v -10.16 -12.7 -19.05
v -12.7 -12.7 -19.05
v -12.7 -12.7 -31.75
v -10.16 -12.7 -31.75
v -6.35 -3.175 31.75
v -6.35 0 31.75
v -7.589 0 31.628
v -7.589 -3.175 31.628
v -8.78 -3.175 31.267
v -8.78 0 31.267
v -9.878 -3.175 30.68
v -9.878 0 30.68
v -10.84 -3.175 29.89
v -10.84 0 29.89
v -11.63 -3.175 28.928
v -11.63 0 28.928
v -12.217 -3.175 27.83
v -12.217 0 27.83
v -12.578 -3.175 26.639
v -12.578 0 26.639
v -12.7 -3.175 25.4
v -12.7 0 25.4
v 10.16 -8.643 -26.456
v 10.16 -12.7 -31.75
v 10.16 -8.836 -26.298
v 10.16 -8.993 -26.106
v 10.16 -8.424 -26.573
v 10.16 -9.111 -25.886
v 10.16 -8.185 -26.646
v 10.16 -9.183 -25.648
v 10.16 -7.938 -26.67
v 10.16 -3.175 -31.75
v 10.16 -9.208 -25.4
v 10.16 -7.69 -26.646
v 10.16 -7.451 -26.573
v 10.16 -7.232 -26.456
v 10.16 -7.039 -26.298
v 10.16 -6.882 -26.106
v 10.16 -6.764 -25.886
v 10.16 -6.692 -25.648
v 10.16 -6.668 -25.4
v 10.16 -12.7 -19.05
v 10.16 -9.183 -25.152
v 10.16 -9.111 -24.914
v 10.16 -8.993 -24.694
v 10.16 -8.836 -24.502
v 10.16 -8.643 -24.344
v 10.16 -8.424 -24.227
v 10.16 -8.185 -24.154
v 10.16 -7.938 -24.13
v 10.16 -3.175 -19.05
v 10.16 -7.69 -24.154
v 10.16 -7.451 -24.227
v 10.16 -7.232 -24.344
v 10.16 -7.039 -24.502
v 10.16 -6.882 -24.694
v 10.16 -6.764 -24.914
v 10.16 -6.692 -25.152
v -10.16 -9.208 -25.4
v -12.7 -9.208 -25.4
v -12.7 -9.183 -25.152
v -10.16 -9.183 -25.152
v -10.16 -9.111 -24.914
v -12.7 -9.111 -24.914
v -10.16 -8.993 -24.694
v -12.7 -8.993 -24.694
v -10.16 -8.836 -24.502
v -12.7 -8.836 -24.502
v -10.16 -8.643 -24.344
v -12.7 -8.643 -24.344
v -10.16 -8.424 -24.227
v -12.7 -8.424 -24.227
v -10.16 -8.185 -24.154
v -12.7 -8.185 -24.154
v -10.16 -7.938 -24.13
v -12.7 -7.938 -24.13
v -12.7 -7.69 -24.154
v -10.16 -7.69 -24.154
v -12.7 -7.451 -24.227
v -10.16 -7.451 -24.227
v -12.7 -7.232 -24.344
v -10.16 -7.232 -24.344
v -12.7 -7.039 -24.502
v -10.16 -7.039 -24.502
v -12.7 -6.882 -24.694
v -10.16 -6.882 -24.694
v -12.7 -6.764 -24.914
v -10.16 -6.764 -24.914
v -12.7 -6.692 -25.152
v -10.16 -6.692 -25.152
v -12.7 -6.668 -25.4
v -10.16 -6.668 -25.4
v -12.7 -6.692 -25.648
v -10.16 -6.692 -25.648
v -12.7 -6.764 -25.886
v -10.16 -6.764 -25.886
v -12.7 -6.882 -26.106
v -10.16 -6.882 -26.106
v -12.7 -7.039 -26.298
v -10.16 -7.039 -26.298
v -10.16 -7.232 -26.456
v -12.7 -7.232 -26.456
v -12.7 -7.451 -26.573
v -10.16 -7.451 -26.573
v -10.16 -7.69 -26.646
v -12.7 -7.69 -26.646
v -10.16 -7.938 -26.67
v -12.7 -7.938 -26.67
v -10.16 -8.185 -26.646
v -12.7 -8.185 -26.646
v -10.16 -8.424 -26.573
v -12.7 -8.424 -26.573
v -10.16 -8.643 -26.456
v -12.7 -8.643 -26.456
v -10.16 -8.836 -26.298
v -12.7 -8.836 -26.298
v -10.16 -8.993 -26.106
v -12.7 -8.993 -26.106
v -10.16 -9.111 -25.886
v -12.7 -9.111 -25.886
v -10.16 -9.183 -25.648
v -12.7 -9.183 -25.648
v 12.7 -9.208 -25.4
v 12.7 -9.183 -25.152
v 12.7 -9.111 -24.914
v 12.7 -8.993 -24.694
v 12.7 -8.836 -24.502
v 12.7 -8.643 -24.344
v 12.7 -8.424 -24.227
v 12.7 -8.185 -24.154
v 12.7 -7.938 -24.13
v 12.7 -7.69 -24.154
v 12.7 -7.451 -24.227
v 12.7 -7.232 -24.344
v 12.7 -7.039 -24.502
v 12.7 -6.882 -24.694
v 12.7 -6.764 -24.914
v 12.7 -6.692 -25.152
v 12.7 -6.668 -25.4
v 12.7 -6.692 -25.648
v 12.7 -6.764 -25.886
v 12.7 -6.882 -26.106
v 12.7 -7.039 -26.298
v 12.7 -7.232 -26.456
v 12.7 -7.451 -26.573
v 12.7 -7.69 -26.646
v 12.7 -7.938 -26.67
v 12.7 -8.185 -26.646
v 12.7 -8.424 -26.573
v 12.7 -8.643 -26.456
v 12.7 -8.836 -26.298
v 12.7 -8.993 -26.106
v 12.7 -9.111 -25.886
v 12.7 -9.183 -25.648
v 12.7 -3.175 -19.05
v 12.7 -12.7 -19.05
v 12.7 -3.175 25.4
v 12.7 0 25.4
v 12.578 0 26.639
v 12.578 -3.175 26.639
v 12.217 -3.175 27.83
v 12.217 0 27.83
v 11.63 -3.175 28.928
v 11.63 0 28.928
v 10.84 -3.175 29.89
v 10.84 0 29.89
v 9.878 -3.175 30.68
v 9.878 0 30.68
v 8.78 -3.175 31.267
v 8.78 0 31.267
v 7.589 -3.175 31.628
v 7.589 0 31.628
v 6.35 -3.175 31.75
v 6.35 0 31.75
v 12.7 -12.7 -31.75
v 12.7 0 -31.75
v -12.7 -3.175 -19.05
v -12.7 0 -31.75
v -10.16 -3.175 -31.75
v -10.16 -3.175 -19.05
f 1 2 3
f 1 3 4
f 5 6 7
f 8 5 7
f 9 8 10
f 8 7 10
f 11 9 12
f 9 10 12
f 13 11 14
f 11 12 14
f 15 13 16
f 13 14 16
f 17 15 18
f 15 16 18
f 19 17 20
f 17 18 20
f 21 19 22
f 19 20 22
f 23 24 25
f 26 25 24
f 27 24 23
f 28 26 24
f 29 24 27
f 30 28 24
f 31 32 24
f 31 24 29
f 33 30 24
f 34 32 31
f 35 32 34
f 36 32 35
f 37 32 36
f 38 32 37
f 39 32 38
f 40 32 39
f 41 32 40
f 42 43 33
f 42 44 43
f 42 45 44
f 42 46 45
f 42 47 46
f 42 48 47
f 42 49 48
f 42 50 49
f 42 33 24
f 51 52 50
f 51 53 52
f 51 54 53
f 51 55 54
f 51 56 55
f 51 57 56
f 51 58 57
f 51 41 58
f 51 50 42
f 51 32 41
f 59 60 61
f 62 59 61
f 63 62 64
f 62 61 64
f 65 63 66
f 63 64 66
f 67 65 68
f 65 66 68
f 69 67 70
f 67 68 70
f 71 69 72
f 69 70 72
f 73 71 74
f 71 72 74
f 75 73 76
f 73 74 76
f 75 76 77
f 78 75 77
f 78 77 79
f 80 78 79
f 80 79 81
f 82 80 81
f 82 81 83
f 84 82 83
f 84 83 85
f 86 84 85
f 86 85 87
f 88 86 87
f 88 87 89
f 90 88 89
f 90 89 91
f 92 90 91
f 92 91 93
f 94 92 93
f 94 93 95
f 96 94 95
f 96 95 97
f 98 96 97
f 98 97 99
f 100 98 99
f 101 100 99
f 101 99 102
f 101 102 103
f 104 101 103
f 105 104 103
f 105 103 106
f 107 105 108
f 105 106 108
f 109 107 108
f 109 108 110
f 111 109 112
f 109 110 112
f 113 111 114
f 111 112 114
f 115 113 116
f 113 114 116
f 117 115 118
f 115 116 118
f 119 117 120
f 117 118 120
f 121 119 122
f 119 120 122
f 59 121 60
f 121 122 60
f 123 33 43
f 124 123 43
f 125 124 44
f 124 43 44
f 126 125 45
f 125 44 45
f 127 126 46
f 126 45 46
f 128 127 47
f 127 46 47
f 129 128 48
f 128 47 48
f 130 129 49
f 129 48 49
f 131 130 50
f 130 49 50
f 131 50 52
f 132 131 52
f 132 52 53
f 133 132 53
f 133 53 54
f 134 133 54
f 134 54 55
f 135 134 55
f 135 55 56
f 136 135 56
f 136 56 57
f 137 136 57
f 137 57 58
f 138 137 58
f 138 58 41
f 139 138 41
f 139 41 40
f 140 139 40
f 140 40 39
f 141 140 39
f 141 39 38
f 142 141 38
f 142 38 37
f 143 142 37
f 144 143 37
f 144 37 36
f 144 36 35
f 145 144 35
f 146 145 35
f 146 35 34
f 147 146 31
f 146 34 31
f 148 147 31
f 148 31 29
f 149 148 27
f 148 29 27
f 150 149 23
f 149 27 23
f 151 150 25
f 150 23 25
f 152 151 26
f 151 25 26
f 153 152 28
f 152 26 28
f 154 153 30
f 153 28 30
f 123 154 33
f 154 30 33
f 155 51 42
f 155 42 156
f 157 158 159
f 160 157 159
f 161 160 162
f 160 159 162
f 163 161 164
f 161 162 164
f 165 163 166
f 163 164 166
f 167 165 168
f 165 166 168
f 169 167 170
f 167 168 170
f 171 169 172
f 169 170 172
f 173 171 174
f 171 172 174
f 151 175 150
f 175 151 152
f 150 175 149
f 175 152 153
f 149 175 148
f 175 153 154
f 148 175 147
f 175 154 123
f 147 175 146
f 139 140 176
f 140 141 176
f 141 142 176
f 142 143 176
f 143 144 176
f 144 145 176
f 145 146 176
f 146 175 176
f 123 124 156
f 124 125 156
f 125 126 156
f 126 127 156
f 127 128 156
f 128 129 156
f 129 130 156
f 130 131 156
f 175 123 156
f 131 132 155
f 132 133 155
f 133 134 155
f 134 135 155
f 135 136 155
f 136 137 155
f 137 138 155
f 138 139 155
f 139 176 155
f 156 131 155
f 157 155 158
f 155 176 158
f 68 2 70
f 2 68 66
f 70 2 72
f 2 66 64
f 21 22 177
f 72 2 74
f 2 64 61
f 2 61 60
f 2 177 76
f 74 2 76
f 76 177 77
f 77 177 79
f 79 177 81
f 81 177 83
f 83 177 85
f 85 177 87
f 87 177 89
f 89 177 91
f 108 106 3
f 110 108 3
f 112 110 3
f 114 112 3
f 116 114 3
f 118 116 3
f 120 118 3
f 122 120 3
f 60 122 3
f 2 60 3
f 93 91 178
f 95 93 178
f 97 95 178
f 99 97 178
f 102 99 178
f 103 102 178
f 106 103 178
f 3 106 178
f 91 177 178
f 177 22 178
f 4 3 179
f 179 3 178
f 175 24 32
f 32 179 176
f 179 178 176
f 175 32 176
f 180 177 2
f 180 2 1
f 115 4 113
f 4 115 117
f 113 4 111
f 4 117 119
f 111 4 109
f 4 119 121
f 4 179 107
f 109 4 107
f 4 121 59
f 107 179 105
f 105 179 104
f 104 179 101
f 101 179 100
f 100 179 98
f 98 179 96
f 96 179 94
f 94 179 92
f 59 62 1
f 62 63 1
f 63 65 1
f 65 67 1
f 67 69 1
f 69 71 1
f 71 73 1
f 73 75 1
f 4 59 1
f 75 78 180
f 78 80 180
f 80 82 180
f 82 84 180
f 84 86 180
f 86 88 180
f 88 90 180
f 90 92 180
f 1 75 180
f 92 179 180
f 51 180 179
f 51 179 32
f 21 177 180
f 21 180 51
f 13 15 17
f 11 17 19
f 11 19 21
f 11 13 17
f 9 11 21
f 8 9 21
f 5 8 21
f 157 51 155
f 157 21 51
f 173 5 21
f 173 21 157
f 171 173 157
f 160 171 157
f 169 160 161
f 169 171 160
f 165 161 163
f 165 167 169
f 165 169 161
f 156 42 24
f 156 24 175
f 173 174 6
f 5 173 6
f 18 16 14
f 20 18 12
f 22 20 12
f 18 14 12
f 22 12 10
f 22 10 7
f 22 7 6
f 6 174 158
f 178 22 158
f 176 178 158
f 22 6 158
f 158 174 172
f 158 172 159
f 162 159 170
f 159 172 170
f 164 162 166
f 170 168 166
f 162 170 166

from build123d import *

# Parameters (mm, degrees)
F1_DEPTH = 3.175
F2_W     = 2.54
F2_H     = 12.7
F3_DEPTH = 12.7
F5_D     = 2.54


with BuildPart() as f1:
    # F0 (on Front) → F1 (new body)
    with BuildSketch(Plane.XZ):
        with BuildLine():
            Line((-12.7, -31.75), (12.7, -31.75))
            Line((12.7, -31.75), (12.7, 25.4))
            ThreePointArc((12.7, 25.4), (10.840128, 29.890128), (6.35, 31.75))
            Line((6.35, 31.75), (-6.35, 31.75))
            ThreePointArc((-6.35, 31.75), (-10.840128, 29.890128), (-12.7, 25.4))
            Line((-12.7, 25.4), (-12.7, -31.75))
        make_face()
    extrude(amount=F1_DEPTH)

    # F2 (on Front) → F3 (join)
    with BuildSketch(Plane.XZ):
        with Locations((11.43, -25.4)):
            Rectangle(F2_W, F2_H)
        with Locations((-11.43, -25.4)):
            Rectangle(F2_W, F2_H)
    extrude(amount=F3_DEPTH)

    # F5 (through all)
    with Locations(Plane.YZ.offset(12.7)):
        with Locations((-7.9375, -25.4)):
            Hole(F5_D / 2)


solid = f1.part
